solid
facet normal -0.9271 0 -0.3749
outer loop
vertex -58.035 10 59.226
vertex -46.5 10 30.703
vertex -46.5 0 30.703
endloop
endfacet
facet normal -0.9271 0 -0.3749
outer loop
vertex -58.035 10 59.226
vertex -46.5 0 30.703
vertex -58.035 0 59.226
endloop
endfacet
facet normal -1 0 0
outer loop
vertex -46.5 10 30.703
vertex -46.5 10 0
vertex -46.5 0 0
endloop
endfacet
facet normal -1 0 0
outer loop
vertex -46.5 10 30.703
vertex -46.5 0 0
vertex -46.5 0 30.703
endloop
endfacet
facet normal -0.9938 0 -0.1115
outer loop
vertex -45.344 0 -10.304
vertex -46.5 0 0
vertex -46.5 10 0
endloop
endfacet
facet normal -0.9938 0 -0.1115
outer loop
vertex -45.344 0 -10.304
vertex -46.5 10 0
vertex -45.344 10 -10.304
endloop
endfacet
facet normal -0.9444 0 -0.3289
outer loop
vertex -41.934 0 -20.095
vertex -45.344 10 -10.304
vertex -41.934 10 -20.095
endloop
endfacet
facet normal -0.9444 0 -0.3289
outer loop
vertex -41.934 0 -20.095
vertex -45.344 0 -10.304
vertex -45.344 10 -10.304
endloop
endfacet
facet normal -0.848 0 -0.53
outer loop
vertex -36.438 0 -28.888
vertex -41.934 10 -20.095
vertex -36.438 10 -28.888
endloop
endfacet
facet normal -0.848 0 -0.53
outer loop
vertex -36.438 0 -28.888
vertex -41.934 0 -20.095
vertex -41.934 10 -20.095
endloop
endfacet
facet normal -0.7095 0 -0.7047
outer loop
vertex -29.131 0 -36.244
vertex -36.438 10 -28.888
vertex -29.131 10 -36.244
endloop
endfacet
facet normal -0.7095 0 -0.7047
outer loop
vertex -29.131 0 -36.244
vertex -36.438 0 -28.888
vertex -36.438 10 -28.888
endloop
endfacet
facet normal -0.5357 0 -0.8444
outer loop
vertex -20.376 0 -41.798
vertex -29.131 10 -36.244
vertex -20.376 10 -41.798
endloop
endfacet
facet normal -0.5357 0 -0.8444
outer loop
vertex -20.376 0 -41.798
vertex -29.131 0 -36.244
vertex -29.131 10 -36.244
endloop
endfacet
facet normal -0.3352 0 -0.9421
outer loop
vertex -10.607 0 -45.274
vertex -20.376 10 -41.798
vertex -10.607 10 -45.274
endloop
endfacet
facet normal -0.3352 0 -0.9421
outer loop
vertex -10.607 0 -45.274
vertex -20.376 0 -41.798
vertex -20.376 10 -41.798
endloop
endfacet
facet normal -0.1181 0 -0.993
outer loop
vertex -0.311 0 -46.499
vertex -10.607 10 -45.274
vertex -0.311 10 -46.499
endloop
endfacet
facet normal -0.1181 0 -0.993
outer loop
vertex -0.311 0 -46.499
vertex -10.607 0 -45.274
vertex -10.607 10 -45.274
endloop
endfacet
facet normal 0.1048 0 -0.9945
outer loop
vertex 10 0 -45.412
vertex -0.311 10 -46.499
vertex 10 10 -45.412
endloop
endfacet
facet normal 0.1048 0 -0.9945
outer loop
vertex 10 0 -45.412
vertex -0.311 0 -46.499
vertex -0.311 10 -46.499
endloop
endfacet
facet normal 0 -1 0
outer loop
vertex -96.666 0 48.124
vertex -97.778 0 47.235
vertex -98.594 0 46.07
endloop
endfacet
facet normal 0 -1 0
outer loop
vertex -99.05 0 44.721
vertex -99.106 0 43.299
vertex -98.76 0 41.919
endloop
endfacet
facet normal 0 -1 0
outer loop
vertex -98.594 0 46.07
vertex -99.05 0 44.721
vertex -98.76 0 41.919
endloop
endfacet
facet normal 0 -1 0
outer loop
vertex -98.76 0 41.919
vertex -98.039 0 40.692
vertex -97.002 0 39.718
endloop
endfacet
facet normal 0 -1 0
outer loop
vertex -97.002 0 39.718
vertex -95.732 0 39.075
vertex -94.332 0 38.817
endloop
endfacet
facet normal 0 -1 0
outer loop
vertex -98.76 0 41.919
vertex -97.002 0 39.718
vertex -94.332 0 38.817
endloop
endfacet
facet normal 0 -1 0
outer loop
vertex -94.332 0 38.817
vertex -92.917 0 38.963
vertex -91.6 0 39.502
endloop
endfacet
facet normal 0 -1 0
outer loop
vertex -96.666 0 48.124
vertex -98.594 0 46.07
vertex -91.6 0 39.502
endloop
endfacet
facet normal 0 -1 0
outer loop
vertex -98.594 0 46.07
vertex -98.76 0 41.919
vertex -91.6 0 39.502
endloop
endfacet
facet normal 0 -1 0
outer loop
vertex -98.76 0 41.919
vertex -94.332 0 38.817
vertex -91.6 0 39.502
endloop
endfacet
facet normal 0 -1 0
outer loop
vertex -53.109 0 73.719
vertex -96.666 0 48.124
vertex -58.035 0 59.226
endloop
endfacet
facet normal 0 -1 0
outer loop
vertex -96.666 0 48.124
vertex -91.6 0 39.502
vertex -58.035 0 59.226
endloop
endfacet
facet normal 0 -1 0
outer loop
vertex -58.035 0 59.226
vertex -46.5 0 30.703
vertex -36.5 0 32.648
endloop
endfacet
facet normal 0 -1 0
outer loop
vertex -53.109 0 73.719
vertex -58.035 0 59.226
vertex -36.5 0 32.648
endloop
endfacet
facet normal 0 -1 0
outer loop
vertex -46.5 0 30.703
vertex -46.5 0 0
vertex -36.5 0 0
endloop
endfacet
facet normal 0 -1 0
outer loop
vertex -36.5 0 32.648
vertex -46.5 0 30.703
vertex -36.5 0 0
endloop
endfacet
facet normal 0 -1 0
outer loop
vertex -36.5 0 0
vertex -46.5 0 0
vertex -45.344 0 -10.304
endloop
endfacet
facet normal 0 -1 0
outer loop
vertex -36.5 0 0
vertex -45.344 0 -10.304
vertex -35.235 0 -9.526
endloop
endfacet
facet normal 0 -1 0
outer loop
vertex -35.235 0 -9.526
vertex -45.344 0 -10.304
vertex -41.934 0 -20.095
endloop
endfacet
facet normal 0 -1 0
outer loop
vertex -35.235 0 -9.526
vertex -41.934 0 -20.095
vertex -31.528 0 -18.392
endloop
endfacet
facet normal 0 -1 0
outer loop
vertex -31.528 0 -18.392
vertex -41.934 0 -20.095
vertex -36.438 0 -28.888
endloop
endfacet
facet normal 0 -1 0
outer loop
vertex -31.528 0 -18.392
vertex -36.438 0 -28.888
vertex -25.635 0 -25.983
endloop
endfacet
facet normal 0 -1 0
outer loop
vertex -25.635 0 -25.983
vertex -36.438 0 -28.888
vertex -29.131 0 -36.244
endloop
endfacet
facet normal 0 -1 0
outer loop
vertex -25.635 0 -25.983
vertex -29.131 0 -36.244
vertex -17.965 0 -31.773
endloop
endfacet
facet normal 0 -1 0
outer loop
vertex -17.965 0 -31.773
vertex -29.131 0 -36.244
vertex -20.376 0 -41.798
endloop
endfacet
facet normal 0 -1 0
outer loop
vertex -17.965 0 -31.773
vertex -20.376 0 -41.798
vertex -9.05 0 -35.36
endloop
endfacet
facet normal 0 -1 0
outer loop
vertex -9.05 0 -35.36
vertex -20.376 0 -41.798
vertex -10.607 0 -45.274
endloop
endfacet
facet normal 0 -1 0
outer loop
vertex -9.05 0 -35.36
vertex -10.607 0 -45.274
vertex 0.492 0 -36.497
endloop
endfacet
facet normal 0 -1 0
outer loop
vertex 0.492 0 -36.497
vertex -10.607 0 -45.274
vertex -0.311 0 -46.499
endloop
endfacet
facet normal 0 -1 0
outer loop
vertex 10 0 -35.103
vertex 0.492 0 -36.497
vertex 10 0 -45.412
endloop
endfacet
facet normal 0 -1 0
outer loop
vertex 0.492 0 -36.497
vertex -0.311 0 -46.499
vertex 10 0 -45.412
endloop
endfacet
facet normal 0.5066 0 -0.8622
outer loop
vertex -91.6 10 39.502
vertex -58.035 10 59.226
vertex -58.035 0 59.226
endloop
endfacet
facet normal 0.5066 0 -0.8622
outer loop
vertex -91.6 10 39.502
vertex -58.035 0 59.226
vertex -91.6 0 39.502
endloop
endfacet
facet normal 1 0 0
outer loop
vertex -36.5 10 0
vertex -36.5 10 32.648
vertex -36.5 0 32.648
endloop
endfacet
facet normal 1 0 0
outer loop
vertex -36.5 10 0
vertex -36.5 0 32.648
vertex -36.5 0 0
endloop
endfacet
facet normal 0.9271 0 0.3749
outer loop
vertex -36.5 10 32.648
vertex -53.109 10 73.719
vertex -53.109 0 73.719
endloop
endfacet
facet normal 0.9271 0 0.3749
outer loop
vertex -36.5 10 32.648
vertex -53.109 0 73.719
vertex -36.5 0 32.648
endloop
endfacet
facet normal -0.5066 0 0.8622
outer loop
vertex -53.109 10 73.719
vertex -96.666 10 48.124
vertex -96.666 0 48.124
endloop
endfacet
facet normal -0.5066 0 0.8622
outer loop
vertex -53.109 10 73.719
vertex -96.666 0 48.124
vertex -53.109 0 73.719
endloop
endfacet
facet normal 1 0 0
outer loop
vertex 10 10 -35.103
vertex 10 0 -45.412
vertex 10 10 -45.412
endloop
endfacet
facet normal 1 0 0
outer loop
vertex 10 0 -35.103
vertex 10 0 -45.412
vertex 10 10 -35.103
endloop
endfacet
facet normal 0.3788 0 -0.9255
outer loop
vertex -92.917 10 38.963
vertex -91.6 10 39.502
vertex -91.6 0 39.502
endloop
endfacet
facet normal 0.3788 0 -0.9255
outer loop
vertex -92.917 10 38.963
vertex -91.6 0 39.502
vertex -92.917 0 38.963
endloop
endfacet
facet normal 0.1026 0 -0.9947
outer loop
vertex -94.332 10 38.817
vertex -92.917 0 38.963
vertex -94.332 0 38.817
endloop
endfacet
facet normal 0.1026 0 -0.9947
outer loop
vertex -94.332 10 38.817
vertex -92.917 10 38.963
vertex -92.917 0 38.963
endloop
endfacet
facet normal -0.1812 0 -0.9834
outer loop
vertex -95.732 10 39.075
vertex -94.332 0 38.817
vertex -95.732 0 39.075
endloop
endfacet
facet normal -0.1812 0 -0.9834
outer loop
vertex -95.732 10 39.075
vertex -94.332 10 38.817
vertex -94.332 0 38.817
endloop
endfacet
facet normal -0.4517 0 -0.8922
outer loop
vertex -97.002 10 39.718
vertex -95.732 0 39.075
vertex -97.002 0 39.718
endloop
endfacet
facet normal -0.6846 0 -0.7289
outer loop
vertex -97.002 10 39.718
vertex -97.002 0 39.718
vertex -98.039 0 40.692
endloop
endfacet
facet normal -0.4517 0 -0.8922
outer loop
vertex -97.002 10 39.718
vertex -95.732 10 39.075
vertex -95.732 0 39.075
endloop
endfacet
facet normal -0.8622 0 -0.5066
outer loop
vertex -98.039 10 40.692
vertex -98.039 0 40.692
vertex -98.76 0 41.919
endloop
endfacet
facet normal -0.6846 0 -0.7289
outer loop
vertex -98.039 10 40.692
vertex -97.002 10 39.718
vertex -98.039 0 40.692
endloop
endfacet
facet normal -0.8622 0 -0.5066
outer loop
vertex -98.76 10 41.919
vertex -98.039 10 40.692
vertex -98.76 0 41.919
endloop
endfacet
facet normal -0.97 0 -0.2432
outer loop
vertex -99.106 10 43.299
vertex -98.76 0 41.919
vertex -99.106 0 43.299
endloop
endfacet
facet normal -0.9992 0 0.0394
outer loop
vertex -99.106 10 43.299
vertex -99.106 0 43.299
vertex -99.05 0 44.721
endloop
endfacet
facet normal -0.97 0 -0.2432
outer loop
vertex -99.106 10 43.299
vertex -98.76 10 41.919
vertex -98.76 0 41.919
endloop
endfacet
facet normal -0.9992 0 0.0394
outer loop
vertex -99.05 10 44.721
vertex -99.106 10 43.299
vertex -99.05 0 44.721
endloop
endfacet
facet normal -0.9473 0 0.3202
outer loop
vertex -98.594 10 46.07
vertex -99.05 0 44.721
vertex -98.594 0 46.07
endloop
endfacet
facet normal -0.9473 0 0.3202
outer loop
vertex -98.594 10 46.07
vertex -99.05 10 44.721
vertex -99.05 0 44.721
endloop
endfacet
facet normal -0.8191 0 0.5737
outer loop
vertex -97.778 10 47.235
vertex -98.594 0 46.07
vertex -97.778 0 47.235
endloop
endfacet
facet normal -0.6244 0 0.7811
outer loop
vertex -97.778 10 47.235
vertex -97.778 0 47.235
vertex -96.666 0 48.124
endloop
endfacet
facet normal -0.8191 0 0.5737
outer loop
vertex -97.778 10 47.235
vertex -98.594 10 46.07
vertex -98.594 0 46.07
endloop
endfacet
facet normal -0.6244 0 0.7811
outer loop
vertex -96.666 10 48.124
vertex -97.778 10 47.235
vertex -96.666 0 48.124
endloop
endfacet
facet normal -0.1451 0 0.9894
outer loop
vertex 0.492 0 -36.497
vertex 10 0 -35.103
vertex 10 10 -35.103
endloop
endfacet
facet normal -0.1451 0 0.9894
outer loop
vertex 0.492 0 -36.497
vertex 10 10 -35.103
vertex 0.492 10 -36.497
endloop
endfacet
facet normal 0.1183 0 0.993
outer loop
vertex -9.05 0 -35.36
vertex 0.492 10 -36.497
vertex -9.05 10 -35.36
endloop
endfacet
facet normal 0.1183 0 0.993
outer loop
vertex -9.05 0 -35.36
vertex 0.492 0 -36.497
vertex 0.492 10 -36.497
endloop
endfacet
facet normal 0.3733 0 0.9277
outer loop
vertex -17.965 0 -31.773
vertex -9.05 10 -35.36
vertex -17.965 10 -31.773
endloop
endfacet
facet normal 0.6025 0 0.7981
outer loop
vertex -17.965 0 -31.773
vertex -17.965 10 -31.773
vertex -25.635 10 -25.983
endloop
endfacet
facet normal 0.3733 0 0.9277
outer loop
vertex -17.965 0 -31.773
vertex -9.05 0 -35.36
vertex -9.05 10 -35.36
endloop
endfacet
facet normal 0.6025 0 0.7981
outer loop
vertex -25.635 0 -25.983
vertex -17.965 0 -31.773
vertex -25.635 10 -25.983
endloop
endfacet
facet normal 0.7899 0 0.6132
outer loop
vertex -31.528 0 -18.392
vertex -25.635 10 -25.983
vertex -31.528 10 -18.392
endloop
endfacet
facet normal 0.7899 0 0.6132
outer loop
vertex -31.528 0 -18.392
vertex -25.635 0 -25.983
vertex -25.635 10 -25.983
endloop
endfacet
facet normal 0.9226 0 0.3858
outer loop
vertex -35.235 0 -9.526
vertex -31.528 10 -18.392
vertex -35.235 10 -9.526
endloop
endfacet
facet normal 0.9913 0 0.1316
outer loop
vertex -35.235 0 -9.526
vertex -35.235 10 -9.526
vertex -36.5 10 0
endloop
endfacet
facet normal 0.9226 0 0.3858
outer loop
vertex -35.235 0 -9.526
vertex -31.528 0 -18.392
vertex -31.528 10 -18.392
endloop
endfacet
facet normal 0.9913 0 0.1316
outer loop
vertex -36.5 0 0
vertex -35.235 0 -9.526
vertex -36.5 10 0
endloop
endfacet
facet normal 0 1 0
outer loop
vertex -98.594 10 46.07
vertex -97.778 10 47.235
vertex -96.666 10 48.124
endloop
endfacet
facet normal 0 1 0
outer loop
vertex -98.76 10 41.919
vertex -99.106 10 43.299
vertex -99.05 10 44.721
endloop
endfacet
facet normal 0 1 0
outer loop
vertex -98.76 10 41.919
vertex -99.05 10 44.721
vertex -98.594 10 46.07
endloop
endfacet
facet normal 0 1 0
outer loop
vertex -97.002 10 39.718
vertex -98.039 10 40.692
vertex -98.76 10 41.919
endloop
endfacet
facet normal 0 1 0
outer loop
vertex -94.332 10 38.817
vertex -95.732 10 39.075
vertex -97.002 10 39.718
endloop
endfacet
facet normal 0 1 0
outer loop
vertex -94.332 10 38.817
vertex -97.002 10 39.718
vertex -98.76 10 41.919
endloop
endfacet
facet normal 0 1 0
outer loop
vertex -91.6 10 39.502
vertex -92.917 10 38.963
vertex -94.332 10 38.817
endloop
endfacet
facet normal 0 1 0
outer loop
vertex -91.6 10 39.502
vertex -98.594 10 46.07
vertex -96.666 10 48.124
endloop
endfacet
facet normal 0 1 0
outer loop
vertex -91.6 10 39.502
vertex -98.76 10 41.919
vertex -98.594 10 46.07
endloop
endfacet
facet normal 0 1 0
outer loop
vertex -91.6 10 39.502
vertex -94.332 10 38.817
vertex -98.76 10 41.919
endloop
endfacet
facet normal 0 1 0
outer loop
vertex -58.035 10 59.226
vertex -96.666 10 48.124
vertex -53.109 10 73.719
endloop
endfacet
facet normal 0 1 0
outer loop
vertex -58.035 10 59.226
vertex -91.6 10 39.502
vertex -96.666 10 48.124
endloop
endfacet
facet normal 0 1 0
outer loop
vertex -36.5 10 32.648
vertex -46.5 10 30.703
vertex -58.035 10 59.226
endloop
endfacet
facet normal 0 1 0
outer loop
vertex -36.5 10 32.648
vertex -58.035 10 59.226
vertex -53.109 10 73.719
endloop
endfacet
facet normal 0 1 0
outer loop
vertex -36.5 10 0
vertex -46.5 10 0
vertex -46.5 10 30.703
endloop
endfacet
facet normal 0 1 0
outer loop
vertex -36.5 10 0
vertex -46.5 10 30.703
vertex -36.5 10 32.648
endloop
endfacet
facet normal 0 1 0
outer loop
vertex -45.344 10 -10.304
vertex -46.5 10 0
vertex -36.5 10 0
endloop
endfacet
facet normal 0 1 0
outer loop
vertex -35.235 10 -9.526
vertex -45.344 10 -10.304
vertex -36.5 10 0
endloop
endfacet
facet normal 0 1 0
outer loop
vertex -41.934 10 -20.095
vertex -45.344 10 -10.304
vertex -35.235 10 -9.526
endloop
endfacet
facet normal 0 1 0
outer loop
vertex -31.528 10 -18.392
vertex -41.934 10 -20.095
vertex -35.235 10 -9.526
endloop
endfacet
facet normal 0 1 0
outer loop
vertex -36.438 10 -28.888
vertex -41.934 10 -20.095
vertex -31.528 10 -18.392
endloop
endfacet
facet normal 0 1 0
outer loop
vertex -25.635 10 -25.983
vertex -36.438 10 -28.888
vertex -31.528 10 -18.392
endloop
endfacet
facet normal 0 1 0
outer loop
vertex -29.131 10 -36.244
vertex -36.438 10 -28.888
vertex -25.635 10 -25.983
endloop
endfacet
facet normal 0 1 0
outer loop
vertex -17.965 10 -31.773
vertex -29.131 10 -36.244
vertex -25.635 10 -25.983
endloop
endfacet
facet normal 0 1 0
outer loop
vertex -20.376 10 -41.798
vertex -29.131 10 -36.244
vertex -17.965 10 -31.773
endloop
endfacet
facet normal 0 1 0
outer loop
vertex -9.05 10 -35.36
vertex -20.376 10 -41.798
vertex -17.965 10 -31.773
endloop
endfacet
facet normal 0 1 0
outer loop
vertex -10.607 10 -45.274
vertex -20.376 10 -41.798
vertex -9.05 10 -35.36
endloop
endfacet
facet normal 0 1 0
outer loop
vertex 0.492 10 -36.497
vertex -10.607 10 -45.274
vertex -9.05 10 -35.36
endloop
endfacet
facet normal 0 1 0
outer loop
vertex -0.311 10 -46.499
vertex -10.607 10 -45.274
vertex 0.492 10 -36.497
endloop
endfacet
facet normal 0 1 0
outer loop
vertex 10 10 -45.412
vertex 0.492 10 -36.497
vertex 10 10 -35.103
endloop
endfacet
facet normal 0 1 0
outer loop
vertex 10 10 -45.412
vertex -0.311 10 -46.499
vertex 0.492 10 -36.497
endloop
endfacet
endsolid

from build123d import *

# Parameters (mm, degrees)
BOSS_EXTRU_1_DEPTH = 10
BOSS_EXTRU_2_DEPTH = 10


with BuildPart() as part:
    # Esquisse1 → Boss.-Extru.1 (new body)
    with BuildSketch(Plane(origin=(0, 0, 0), x_dir=(1, 0, 0), z_dir=(0, 1, 0))):
        with BuildLine():
            Line((10, 45.412002819), (10, 35.103418637))
            ThreePointArc((10, 35.103418637), (-21.991475621, 29.131168875), (-36.5, 0))
            Line((-36.5, 0), (-46.5, 0))
            ThreePointArc((-46.5, 0), (-29.131168875, 36.243965015), (10, 45.412002819))
        make_face()
    extrude(amount=BOSS_EXTRU_1_DEPTH)

    # Esquisse4 → Boss.-Extru.2 (add)
    with BuildSketch(Plane(origin=(0, 10, 0), x_dir=(1, 0, 0), z_dir=(0, 1, 0))):
        with BuildLine():
            Line((-36.5, 0), (-46.5, 0))
            Line((-46.5, 0), (-46.5, -30.702684518))
            Line((-46.5, -30.702684518), (-58.034822919, -59.225728707))
            Line((-58.034822919, -59.225728707), (-91.599603917, -39.502076956))
            ThreePointArc((-91.599603917, -39.502076956), (-98.443575905, -41.279729178), (-96.665923684, -48.123701166))
            Line((-96.665923684, -48.123701166), (-53.109165443, -73.7189324))
            Line((-53.109165443, -73.7189324), (-36.5, -32.648170999))
            Line((-36.5, -32.648170999), (-36.5, 0))
        make_face()
    extrude(amount=-BOSS_EXTRU_2_DEPTH)


solid = part.part
